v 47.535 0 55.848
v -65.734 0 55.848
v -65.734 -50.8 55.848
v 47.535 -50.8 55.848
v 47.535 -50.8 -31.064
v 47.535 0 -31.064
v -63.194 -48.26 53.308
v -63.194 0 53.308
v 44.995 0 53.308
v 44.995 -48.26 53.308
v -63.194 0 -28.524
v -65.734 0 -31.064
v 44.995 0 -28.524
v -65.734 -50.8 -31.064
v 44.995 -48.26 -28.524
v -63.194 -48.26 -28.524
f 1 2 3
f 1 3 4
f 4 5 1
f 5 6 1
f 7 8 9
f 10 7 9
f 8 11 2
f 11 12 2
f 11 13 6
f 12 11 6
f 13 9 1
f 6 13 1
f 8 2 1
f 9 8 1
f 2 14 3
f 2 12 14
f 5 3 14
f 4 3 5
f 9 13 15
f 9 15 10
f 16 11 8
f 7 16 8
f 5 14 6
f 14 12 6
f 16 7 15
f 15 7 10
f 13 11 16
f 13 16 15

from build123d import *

# Parameters (mm, degrees)
F0_W     = 113.2690608501
F0_H     = 86.9128275663
F2_DEPTH = 25.4
F3_DEPTH = 25.4
F4_T     = -2.54


# Not quite as in the source:
# - a feature names something its author has since deleted; it is built from what else it names
# - the program builds the solid bodies; features that only make, move or delete a surface that nothing else refers to are left out


with BuildPart() as f2:
    # F0 (on Front) → F2 (new body)
    with BuildSketch(Plane.XZ):
        with Locations((-9.0991780162, 12.3919239268)):
            Rectangle(F0_W, F0_H)
    extrude(amount=F2_DEPTH)

    # F3 (add): a face of the model
    f3_faces = [f2.faces().sort_by_distance(p)[0] for p in [
        (-9.0991780162, -25.4, 12.3919239268),
    ]]
    extrude(f3_faces, amount=F3_DEPTH)

    # F4
    f4_openings = [f2.faces().sort_by_distance(p)[0] for p in [
        (-9.099178, 0, 12.391924),
    ]]
    offset(amount=F4_T, openings=f4_openings)


with BuildPart() as f2_1:
    # F10: moved
    add(f2.part)


solid = f2_1.part
